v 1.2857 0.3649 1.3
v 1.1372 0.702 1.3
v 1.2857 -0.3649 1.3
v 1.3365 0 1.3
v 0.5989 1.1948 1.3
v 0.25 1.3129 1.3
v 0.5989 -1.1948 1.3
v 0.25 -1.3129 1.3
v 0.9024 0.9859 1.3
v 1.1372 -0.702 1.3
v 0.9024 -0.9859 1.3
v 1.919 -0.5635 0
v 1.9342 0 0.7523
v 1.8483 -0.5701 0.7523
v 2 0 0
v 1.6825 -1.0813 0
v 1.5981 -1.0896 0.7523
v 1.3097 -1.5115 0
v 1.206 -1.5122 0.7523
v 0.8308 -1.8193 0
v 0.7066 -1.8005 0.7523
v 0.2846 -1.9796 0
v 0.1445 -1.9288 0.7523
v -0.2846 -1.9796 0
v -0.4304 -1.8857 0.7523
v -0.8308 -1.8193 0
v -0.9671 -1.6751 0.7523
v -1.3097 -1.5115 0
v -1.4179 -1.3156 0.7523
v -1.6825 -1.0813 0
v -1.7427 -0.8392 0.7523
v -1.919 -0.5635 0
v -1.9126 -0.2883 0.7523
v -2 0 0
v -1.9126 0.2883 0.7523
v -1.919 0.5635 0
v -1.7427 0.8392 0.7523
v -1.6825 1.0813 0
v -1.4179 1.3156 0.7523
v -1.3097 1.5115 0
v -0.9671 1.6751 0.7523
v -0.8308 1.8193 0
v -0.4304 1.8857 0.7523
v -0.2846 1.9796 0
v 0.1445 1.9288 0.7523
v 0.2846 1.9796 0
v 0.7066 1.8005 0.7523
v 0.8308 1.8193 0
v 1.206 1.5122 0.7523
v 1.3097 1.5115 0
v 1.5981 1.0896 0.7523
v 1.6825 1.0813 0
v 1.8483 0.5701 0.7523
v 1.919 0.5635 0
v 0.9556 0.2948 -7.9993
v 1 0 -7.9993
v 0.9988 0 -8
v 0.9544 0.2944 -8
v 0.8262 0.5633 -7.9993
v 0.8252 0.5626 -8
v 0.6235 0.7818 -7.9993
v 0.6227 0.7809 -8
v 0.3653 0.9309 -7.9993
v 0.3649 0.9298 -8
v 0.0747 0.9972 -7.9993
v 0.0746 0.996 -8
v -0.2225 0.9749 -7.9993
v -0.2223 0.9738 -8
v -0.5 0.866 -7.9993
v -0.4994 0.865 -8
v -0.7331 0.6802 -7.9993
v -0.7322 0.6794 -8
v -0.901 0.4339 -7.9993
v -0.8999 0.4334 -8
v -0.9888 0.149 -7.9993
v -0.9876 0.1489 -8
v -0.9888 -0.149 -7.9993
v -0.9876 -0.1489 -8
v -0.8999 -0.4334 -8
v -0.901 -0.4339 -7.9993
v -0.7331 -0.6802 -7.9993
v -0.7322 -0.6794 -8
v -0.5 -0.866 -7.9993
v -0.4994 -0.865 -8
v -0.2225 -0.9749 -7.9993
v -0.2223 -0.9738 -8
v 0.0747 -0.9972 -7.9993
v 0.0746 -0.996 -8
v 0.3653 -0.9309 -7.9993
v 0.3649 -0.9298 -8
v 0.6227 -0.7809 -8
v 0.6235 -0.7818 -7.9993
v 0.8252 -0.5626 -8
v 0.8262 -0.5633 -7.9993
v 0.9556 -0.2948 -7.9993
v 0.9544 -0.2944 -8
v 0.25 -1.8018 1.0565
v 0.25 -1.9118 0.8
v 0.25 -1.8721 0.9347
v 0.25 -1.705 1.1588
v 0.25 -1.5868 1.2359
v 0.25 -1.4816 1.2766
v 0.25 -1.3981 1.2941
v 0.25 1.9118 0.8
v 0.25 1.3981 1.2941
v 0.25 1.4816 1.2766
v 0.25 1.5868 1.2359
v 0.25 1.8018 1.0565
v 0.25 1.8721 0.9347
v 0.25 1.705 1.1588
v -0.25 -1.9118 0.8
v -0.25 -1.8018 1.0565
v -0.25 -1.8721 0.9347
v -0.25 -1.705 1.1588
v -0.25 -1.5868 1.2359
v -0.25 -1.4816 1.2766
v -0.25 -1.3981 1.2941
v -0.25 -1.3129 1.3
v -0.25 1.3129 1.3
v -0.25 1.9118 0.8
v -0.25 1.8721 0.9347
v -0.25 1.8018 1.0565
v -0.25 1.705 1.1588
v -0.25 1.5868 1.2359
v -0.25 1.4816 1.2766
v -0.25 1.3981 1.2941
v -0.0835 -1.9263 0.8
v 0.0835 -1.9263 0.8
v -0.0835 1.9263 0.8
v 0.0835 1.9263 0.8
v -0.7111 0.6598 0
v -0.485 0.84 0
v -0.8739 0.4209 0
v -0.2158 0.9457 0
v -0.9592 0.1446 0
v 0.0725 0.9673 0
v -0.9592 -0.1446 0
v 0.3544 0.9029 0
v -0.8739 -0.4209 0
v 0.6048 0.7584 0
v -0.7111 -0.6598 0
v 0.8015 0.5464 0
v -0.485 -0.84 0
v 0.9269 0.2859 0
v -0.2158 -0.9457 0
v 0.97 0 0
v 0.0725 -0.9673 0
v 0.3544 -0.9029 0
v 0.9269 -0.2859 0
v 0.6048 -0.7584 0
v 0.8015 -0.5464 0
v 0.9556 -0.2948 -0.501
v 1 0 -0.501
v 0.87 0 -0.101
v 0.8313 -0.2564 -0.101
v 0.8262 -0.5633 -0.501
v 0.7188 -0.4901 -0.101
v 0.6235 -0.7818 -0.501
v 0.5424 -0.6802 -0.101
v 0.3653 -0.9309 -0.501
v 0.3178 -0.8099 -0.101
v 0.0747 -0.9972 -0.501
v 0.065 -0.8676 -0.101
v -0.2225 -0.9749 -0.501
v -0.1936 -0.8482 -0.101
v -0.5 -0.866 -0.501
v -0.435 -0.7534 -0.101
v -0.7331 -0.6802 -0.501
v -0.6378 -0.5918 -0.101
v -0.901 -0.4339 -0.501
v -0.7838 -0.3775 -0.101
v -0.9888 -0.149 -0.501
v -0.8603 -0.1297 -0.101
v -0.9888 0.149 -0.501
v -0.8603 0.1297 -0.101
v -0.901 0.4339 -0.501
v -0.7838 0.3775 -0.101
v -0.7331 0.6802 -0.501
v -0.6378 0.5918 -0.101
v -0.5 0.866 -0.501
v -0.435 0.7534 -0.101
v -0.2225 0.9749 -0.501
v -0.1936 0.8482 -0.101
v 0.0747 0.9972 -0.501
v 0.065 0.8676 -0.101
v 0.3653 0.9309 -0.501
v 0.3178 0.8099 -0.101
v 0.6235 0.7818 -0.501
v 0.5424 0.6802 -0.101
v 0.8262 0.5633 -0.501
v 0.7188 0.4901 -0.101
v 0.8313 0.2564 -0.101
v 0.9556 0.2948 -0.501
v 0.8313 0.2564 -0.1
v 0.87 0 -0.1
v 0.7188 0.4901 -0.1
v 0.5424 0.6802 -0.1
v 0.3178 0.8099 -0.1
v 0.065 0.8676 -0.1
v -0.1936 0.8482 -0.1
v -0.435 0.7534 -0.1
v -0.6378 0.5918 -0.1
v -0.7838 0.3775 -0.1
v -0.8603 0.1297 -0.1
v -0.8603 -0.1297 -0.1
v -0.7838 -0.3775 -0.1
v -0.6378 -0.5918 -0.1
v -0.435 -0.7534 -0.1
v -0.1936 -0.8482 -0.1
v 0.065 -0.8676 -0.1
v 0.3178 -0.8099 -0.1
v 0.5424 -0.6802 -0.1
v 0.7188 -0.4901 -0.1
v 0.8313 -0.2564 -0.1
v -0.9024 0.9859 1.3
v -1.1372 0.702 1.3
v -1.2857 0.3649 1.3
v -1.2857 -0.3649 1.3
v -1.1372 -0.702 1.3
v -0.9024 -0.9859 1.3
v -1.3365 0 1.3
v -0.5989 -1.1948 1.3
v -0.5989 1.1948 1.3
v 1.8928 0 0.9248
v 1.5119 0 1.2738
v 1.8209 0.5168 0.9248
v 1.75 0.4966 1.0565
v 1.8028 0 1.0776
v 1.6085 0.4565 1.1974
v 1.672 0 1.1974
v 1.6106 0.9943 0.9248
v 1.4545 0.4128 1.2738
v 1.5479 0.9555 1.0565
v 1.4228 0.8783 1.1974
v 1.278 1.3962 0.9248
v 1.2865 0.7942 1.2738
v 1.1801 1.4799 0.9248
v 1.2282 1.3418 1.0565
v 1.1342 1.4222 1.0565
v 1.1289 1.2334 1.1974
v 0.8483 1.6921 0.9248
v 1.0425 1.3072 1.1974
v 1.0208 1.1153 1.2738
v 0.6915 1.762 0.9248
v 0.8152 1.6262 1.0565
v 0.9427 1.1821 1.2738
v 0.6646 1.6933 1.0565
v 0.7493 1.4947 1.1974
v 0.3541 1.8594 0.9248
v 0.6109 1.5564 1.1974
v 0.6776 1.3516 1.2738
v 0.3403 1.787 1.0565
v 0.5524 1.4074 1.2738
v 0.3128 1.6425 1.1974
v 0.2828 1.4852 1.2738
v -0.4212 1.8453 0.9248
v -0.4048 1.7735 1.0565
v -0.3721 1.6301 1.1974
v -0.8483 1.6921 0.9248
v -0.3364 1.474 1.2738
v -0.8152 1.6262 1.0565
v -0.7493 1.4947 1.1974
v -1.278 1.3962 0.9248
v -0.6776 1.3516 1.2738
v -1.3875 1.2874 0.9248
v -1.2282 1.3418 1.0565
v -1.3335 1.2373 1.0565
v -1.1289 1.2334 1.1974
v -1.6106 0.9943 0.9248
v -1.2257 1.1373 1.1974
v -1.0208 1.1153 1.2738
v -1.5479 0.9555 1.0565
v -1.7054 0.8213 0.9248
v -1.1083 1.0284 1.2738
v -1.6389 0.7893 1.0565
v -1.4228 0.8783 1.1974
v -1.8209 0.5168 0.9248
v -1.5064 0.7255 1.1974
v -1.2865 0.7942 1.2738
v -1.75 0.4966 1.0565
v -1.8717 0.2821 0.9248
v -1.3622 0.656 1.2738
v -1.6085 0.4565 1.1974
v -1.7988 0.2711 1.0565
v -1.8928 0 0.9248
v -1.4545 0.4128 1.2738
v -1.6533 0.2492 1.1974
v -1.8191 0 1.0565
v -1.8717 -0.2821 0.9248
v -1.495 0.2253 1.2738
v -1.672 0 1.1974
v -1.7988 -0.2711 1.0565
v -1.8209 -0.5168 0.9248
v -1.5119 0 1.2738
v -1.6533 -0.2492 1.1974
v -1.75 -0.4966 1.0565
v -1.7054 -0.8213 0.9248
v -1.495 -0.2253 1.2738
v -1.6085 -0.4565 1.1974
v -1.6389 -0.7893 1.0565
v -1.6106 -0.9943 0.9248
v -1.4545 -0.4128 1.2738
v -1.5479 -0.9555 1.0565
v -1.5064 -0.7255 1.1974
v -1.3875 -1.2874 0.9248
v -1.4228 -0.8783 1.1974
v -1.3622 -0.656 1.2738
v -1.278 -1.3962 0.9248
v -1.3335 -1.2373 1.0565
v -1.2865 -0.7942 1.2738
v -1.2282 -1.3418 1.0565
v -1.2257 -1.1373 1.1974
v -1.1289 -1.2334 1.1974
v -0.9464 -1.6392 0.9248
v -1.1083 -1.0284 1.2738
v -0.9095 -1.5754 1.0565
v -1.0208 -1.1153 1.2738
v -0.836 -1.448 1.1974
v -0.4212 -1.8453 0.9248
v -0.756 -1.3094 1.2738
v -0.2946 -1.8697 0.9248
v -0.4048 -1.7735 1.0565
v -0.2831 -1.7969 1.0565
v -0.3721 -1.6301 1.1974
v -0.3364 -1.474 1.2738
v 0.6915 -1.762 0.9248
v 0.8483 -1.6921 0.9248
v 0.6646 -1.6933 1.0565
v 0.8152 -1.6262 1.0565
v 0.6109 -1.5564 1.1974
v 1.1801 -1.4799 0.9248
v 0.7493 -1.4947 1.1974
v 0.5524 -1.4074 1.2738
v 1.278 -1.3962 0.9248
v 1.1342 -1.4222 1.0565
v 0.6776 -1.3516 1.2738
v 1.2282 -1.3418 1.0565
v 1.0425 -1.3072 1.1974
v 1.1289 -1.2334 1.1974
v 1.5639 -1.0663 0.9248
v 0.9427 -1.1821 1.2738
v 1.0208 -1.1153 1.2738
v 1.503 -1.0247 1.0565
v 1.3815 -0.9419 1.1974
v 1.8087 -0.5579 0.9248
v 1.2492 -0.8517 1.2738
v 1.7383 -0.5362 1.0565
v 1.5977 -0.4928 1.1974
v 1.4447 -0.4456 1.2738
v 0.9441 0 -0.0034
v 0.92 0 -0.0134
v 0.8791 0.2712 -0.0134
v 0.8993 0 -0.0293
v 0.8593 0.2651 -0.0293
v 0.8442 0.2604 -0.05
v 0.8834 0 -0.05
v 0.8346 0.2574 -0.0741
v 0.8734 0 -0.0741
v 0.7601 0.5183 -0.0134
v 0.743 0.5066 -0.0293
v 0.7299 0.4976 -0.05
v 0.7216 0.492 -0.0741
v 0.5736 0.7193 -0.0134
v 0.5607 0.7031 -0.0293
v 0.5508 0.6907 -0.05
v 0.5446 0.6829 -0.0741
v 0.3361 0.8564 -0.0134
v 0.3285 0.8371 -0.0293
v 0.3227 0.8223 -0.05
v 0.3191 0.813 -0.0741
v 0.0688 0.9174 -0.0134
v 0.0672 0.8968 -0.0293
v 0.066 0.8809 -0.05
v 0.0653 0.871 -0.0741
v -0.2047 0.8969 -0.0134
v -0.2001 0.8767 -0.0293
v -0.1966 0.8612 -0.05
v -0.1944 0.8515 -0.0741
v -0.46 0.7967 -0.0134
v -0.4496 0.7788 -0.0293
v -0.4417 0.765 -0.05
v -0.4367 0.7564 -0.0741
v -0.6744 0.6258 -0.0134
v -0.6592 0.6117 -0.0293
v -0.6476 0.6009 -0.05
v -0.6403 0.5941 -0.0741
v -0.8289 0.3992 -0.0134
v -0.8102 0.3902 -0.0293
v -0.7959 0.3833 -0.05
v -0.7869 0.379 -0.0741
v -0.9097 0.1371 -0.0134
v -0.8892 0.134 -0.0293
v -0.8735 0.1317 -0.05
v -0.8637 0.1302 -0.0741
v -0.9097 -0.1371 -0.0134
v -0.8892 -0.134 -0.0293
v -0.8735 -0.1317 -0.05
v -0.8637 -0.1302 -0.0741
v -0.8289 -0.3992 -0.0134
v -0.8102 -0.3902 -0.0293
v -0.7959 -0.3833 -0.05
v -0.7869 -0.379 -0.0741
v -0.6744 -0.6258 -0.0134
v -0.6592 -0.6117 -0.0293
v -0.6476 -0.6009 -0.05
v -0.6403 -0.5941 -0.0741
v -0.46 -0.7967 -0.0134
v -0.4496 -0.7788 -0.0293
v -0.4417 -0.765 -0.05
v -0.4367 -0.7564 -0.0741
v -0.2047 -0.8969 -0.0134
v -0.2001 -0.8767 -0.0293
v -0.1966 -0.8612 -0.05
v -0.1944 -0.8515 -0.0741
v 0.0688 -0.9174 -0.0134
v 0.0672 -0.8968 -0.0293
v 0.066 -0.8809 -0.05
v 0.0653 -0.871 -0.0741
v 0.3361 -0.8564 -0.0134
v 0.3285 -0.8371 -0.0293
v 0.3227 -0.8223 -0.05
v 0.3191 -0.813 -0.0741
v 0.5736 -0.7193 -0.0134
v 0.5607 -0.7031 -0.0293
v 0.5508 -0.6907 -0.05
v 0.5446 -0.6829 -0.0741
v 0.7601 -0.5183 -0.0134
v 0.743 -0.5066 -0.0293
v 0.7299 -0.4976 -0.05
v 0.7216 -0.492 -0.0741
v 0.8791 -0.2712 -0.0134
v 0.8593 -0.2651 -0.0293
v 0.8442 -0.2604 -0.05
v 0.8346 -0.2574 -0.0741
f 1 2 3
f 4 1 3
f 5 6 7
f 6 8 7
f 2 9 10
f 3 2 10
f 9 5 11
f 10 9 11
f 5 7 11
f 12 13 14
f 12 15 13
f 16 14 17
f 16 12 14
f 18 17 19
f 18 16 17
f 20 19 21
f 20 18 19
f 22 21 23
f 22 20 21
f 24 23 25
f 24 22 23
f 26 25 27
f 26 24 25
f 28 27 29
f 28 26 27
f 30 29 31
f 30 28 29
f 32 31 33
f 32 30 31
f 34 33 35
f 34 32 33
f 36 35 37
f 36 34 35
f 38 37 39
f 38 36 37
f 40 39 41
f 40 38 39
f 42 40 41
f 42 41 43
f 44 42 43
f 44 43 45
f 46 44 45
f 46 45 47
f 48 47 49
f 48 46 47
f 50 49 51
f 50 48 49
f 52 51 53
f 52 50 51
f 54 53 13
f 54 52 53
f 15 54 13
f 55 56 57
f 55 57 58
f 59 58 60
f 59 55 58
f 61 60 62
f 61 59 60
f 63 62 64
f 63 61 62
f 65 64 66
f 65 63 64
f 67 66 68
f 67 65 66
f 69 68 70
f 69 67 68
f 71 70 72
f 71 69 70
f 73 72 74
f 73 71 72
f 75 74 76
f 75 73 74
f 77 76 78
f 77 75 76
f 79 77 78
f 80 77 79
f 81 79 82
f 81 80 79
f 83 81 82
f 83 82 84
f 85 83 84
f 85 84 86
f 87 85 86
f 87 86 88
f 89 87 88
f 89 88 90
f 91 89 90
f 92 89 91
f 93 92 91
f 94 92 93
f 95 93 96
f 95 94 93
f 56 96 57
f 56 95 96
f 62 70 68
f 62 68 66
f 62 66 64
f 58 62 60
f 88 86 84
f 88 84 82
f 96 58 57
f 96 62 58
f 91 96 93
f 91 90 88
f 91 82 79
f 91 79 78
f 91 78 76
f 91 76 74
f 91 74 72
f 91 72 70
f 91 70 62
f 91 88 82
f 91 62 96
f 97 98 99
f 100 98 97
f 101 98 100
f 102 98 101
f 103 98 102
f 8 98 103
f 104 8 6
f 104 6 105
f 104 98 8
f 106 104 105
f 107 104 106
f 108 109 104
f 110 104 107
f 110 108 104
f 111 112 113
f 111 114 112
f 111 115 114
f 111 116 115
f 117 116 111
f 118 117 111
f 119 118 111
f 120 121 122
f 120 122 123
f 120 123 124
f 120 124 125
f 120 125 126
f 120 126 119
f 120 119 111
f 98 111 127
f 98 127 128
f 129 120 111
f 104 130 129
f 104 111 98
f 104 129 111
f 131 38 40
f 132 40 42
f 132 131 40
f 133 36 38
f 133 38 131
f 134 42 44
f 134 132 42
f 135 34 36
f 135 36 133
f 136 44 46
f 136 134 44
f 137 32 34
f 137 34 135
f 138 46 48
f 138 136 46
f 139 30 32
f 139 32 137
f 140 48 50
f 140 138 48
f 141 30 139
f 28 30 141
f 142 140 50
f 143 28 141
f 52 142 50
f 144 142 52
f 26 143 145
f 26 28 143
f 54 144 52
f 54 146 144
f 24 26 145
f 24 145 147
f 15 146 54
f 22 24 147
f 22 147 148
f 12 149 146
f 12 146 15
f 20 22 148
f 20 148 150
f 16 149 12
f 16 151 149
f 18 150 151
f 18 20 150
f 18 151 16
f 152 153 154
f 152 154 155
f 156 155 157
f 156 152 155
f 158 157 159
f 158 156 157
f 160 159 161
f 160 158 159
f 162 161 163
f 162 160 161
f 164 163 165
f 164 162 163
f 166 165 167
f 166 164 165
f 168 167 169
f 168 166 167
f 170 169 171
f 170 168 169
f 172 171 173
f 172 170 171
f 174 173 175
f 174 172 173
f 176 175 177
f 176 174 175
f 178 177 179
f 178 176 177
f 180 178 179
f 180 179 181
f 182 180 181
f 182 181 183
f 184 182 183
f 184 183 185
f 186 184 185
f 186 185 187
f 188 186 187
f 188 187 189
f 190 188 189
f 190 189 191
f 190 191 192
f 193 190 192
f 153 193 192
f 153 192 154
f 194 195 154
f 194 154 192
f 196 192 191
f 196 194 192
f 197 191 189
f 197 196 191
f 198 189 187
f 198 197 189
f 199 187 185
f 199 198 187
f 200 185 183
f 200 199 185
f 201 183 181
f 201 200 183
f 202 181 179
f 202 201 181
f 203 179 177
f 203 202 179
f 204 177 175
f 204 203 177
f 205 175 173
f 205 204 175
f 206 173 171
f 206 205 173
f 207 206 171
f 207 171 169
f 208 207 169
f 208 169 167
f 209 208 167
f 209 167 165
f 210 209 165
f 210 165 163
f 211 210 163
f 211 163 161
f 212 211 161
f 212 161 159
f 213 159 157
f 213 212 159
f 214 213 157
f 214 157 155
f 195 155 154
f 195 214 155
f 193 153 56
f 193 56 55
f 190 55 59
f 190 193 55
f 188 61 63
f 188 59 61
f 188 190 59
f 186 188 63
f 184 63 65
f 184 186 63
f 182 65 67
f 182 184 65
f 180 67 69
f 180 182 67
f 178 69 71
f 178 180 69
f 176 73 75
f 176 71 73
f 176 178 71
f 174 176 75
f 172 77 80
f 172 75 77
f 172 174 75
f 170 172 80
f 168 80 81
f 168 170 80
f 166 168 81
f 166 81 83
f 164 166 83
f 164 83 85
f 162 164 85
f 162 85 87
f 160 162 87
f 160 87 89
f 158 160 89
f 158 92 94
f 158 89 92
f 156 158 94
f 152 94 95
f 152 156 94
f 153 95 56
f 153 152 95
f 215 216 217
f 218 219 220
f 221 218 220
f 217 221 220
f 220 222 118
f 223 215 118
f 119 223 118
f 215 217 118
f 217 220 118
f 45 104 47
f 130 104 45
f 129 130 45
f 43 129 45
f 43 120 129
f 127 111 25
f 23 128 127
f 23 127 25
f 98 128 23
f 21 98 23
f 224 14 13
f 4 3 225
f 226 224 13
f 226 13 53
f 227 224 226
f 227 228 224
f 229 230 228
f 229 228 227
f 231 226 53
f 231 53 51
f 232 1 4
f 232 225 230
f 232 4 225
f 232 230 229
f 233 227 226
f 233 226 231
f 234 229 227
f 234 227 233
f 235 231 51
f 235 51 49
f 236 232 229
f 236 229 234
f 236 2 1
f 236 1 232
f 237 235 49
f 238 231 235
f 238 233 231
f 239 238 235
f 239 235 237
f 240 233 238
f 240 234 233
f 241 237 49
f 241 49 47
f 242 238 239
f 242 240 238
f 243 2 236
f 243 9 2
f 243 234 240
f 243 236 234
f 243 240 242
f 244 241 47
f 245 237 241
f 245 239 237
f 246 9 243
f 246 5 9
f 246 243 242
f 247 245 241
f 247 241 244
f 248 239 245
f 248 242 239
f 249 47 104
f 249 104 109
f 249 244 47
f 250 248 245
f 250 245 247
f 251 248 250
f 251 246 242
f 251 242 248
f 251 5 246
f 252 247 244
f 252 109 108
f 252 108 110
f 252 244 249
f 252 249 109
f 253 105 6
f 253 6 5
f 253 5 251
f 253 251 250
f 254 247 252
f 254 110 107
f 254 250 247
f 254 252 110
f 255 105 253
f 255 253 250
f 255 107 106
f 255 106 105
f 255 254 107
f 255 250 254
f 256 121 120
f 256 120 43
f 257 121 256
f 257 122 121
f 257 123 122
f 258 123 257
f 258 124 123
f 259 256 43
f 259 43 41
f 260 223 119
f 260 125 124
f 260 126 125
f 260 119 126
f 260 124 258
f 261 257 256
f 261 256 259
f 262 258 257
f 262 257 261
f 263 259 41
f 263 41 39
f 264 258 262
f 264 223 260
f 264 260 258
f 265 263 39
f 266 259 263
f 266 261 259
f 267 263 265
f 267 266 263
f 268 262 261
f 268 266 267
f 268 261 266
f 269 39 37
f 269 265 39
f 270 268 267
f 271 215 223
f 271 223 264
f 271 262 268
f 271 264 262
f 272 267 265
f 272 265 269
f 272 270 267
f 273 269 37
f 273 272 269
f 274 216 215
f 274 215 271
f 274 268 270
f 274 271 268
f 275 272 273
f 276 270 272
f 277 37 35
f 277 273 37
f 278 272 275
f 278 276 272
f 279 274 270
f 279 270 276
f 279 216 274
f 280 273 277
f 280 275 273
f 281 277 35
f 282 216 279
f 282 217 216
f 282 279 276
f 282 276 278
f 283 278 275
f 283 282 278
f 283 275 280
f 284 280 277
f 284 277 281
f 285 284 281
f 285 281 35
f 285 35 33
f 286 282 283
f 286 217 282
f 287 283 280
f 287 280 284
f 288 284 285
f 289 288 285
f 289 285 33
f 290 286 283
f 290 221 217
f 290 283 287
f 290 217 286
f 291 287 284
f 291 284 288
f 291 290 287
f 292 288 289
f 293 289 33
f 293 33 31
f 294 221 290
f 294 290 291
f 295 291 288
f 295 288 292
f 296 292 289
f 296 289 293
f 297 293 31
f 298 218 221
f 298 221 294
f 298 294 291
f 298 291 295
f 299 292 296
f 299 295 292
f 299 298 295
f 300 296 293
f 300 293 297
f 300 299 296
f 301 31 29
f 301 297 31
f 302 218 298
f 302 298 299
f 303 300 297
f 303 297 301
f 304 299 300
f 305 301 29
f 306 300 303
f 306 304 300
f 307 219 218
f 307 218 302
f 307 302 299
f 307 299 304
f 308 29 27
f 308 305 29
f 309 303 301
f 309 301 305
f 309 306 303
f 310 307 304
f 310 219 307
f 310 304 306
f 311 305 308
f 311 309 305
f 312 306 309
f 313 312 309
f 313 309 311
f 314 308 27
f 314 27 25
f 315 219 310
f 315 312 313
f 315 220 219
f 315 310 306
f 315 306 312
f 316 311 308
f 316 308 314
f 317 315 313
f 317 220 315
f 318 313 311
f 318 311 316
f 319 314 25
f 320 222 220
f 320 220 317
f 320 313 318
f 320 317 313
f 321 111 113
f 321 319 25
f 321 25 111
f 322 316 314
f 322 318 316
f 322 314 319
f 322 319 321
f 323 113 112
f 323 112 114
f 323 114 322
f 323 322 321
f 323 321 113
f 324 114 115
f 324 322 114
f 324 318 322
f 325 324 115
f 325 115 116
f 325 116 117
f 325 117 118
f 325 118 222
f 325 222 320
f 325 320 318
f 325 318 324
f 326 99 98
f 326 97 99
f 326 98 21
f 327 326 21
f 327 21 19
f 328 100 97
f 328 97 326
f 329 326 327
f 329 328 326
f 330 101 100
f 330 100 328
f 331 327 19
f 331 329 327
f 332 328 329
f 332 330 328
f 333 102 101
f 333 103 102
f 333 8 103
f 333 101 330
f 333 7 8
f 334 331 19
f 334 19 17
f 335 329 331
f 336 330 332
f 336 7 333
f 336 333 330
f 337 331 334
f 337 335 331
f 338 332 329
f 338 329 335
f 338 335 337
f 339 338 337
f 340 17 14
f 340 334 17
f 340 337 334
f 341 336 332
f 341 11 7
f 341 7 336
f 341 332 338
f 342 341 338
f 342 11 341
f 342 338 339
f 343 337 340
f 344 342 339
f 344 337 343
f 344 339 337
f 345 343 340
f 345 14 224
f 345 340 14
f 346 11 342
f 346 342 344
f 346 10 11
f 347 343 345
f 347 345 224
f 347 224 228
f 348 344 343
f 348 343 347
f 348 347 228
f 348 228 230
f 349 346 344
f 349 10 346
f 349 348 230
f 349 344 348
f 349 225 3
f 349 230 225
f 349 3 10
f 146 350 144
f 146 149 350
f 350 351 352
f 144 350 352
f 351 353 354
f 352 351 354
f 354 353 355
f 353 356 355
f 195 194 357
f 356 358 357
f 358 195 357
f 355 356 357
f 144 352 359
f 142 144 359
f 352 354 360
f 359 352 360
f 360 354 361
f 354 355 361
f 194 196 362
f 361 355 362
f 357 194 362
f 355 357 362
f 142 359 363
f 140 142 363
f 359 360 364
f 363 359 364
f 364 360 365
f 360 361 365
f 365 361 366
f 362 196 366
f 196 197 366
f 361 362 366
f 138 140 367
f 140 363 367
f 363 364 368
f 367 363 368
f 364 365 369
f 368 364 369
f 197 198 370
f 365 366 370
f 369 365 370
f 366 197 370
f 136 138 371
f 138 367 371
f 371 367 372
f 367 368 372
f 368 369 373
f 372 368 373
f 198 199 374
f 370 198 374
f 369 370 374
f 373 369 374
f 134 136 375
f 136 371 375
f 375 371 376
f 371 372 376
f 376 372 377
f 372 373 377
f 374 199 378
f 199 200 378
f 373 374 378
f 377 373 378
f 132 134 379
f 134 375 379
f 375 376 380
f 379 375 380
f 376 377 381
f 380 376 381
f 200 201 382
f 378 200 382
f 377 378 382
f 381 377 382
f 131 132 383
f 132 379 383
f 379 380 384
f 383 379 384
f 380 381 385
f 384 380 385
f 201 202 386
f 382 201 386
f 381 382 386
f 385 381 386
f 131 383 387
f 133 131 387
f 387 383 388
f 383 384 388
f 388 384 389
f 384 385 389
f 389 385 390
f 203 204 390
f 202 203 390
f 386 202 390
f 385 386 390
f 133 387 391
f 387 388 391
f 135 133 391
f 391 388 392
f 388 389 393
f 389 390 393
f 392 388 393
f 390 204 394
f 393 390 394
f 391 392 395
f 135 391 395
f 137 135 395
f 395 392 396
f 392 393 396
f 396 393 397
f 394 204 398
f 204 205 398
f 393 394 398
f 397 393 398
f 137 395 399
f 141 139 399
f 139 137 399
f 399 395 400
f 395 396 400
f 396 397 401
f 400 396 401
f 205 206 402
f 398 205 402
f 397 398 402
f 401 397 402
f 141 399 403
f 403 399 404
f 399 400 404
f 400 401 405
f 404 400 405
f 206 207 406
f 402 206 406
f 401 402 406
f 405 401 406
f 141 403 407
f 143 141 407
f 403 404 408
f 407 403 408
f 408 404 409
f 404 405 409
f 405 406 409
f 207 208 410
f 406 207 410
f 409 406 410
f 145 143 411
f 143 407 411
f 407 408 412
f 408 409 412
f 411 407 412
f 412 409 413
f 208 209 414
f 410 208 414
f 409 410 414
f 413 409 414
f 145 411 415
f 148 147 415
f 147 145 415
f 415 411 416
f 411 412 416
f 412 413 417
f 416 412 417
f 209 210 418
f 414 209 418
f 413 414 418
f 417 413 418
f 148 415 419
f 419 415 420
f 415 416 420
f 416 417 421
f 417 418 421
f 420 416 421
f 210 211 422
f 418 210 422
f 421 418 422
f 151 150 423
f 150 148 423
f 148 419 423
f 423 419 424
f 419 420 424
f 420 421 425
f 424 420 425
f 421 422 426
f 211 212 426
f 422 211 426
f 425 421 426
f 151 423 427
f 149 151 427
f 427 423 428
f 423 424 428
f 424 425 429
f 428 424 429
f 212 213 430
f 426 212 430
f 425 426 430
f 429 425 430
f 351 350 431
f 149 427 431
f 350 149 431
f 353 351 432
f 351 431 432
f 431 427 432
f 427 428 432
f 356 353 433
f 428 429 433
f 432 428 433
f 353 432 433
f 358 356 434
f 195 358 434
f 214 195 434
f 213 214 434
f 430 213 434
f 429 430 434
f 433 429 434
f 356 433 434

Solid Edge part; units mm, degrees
sketch "Sketch1" plane through (0, 0, 0) normal (0, -1, 0) x (1, 0, 0)
  line L0 (0, -8) -> (1, -8)
  line L1 (1, -8) -> (1, -0.501)
  line L2 (1, -0.501) -> (0.87, -0.101)
  line L3 (0.87, -0.101) -> (0.87, 0)
  line L4 (0.87, 0) -> (2, 0)
  line L5 (2, 0) -> (1.8863, 1.3)
  line L6 (1.8863, 1.3) -> (0, 1.3)
  dimension "D1" = 1
  dimension "D2" = 0.87
  dimension "D3" = 8
  dimension "D4" = 7.499
  dimension "D5" = 0.4
  dimension "D6" = 2
  dimension "D7" = 1.3
revolve "RevolvedProtrusion1" add sketch "Sketch1" angle 360 about axis through (0, 0, 6) along (0, 0, -1)
fillet "Round_1" radius 0.6 1 edges at (-1.8863, 0, 1.3)
sketch "Sketch2" plane through (0, 0, 0) normal (0, -1, 0) x (1, 0, 0)
  line L0 (-0.25, 1.3) -> (-0.25, 0.8)
  line L1 (-0.25, 0.8) -> (0.25, 0.8)
  line L2 (0.25, 0.8) -> (0.25, 1.3)
  line L3 (0.25, 1.3) -> (-0.25, 1.3)
  dimension "D1" = 0.5
  dimension "D2" = 0.5
  dimension "D3" = 1.3
extrude "ExtrudedCutout_1" cut sketch "Sketch2" along normal mid plane 4
cosmetic_thread "Thread_1" size "M2" thread depth 7.499
fillet "Round_2" radius 0.1 1 edges at (-0.87, 0, 0)
chamfer "Chamfer_1" distance 0.0012 angle 30 1 edges at (-1, 0, -8) measured on face at (0.6867, 0.6467, -8)
properties material "Steel"
